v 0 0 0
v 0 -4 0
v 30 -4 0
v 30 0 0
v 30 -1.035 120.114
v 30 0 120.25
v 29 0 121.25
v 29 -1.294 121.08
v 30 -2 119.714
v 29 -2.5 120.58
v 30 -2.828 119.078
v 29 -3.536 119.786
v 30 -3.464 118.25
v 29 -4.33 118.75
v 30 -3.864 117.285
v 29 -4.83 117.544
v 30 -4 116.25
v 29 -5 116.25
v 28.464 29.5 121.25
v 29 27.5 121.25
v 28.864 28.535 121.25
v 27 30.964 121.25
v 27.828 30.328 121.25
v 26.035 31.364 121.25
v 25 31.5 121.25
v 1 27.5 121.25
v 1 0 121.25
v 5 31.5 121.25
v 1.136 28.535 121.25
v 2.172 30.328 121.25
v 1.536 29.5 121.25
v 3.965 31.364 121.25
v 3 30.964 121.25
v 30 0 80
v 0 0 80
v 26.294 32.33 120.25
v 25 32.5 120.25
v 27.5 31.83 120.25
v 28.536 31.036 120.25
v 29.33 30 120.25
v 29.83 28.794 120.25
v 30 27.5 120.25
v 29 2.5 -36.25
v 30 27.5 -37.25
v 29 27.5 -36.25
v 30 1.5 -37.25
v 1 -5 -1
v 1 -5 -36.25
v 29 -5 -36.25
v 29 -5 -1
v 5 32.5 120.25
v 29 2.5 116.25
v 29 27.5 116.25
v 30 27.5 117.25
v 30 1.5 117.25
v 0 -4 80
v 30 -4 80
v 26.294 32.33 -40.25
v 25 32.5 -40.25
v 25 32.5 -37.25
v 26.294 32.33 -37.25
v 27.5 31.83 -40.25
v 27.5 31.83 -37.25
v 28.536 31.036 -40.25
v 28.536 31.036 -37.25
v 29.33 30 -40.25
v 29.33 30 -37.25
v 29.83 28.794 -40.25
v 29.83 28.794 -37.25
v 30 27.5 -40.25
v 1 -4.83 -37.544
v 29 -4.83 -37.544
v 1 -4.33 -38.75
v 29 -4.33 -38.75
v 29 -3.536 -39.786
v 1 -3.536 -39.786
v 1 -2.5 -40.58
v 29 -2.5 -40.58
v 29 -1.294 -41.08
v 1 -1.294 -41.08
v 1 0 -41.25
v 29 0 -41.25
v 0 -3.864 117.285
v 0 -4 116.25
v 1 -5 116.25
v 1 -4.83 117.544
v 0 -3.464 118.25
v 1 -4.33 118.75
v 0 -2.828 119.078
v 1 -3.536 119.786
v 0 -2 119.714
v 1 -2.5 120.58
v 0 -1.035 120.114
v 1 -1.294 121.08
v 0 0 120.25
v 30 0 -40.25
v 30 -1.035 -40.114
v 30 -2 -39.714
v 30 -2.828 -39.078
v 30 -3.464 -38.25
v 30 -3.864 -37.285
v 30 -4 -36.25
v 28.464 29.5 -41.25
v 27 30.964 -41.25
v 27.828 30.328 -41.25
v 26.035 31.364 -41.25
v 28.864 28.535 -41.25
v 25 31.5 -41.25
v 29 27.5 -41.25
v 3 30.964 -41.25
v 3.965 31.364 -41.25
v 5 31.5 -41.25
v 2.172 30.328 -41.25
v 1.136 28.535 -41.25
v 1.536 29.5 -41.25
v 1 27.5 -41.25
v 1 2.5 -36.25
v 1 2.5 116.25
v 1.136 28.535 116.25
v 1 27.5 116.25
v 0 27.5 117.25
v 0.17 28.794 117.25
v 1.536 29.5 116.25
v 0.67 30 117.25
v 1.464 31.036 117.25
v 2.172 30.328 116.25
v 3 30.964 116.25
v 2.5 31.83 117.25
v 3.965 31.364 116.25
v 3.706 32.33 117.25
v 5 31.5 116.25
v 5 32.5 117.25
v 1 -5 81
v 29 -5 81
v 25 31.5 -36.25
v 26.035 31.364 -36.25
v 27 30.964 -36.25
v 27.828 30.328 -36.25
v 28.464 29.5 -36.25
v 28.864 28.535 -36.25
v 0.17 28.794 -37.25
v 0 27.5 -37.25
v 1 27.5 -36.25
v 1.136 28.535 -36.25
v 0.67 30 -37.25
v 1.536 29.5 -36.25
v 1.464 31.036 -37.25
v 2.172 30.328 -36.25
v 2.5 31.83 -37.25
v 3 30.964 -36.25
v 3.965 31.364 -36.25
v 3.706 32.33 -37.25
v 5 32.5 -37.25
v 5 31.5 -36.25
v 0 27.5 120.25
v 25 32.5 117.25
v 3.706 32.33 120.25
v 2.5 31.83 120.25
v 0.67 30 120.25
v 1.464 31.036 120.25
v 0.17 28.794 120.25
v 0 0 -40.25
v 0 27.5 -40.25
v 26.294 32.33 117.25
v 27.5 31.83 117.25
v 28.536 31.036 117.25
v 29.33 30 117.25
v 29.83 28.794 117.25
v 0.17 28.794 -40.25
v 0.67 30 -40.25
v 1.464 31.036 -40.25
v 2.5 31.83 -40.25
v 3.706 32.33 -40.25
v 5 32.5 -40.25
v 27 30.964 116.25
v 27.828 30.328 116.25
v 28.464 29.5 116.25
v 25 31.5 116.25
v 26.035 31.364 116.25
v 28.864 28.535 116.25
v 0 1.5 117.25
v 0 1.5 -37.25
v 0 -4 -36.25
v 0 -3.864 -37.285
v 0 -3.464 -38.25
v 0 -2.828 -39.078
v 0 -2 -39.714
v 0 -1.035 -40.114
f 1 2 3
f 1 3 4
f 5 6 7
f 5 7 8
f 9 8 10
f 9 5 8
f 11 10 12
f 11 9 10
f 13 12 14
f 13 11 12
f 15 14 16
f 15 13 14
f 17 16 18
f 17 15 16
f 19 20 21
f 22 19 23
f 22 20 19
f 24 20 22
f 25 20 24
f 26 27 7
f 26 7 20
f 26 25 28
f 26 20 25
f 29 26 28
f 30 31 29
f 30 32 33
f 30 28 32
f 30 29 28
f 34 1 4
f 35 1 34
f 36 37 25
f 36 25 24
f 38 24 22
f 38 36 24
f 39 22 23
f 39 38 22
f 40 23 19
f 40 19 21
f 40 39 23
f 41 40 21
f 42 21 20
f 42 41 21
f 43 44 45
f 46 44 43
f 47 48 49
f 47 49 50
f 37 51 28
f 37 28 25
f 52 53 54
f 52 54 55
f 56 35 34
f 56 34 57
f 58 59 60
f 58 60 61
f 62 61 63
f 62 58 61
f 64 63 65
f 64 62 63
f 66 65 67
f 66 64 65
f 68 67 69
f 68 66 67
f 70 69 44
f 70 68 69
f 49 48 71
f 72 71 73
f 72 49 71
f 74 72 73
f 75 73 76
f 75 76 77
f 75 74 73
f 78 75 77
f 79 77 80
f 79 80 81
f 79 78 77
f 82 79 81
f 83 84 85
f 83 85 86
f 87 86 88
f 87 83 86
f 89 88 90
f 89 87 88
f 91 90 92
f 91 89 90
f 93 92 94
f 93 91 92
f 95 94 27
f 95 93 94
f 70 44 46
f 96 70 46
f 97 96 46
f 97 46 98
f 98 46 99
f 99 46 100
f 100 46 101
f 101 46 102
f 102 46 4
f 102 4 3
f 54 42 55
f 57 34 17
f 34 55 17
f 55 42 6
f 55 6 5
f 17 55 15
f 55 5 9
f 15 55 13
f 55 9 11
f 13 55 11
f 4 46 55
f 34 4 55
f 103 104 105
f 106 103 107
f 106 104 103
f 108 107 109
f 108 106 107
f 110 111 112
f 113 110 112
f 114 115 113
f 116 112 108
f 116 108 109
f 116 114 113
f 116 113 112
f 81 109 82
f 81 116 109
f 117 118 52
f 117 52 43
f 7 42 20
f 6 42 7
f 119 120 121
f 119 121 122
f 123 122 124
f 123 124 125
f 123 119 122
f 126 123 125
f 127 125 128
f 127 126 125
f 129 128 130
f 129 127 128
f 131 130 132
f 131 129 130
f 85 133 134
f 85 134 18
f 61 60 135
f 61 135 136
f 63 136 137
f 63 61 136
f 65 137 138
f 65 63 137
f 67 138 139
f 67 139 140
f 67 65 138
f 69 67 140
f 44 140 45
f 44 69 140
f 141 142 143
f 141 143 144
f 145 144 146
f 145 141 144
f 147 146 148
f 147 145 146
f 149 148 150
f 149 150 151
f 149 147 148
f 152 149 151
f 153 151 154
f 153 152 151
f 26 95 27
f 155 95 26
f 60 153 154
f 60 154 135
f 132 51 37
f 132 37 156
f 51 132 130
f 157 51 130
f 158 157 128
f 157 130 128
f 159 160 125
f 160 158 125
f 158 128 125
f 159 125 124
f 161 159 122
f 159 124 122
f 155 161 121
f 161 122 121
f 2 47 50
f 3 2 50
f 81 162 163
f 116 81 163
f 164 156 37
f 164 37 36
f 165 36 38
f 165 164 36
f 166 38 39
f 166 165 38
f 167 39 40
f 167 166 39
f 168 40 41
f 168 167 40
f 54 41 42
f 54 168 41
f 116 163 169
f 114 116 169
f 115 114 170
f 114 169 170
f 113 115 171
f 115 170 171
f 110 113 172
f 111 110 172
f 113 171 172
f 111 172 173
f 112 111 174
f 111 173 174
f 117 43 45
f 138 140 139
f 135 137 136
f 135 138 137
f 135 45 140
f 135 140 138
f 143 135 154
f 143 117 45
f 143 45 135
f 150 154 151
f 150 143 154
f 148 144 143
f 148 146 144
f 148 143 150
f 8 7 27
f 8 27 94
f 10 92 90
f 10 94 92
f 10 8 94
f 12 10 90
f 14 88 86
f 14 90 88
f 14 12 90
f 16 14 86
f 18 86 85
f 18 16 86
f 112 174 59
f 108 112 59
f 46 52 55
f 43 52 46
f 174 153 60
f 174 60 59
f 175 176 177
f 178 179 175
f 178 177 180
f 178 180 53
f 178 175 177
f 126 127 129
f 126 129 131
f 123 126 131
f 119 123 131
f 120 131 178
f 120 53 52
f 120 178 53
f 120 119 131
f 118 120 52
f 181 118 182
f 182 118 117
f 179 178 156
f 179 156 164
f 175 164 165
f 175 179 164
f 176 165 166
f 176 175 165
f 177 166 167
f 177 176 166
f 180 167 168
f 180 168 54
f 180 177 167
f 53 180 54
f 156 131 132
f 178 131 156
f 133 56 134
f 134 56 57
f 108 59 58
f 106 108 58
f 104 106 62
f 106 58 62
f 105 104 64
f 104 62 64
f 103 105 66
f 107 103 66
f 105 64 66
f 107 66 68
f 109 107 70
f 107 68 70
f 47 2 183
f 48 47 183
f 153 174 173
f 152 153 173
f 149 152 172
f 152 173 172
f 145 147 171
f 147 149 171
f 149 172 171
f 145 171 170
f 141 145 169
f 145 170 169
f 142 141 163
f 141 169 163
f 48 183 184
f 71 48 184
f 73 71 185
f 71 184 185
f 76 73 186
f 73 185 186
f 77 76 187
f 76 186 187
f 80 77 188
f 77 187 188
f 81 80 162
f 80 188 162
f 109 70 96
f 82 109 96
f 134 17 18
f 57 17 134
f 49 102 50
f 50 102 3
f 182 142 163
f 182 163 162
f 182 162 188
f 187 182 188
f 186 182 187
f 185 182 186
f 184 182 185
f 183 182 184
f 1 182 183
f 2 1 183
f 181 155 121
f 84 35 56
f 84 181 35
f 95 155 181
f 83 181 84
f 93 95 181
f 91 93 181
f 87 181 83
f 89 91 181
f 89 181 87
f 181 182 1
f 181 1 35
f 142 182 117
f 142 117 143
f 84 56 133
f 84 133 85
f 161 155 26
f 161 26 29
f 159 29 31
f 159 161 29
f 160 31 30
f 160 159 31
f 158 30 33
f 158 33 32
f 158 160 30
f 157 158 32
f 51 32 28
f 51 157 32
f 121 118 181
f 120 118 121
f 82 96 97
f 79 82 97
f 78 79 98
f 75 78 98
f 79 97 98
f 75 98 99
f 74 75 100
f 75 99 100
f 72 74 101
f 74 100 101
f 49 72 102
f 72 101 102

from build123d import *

# Parameters (mm, degrees)
PAD004_DEPTH    = 30
FILLET002_R     = 5
FILLET003_R     = 5
CHAMFER002_SIZE = 1


with BuildPart() as part:
    # Sketch006 → Pad004 (new body)
    with BuildSketch(Plane.YZ):
        Polygon((0, 0), (0, 80), (-5, 80), (-5, 121.25), (32.5, 121.25), (32.5, 116.25), (2.5, 116.25), (2.5, -36.25), (32.5, -36.25), (32.5, -41.25), (-5, -41.25), (-5, 0), align=None)
    extrude(amount=PAD004_DEPTH)

    # Fillet002
    fillet002_edges = [part.edges().sort_by_distance(p)[0] for p in [
        (0, 32.5, 118.75),
        (30, 32.5, 118.75),
        (0, 32.5, -38.75),
        (30, 32.5, -38.75),
    ]]
    fillet(fillet002_edges, radius=FILLET002_R)

    # Fillet003
    fillet003_edges = [part.edges().sort_by_distance(p)[0] for p in [
        (15, -5, 121.25),
        (15, -5, -41.25),
    ]]
    fillet(fillet003_edges, radius=FILLET003_R)

    # Chamfer002
    chamfer002_edges = [part.edges().sort_by_distance(p)[0] for p in [
        (30, 2.5, 40),
        (0, 2.5, 40),
        (15, 32.5, 116.25),
        (15, 32.5, -36.25),
        (15, 32.5, -41.25),
        (15, 32.5, 121.25),
        (15, -5, 80),
        (15, -5, 0),
    ]]
    chamfer(chamfer002_edges, length=CHAMFER002_SIZE)


solid = part.part
